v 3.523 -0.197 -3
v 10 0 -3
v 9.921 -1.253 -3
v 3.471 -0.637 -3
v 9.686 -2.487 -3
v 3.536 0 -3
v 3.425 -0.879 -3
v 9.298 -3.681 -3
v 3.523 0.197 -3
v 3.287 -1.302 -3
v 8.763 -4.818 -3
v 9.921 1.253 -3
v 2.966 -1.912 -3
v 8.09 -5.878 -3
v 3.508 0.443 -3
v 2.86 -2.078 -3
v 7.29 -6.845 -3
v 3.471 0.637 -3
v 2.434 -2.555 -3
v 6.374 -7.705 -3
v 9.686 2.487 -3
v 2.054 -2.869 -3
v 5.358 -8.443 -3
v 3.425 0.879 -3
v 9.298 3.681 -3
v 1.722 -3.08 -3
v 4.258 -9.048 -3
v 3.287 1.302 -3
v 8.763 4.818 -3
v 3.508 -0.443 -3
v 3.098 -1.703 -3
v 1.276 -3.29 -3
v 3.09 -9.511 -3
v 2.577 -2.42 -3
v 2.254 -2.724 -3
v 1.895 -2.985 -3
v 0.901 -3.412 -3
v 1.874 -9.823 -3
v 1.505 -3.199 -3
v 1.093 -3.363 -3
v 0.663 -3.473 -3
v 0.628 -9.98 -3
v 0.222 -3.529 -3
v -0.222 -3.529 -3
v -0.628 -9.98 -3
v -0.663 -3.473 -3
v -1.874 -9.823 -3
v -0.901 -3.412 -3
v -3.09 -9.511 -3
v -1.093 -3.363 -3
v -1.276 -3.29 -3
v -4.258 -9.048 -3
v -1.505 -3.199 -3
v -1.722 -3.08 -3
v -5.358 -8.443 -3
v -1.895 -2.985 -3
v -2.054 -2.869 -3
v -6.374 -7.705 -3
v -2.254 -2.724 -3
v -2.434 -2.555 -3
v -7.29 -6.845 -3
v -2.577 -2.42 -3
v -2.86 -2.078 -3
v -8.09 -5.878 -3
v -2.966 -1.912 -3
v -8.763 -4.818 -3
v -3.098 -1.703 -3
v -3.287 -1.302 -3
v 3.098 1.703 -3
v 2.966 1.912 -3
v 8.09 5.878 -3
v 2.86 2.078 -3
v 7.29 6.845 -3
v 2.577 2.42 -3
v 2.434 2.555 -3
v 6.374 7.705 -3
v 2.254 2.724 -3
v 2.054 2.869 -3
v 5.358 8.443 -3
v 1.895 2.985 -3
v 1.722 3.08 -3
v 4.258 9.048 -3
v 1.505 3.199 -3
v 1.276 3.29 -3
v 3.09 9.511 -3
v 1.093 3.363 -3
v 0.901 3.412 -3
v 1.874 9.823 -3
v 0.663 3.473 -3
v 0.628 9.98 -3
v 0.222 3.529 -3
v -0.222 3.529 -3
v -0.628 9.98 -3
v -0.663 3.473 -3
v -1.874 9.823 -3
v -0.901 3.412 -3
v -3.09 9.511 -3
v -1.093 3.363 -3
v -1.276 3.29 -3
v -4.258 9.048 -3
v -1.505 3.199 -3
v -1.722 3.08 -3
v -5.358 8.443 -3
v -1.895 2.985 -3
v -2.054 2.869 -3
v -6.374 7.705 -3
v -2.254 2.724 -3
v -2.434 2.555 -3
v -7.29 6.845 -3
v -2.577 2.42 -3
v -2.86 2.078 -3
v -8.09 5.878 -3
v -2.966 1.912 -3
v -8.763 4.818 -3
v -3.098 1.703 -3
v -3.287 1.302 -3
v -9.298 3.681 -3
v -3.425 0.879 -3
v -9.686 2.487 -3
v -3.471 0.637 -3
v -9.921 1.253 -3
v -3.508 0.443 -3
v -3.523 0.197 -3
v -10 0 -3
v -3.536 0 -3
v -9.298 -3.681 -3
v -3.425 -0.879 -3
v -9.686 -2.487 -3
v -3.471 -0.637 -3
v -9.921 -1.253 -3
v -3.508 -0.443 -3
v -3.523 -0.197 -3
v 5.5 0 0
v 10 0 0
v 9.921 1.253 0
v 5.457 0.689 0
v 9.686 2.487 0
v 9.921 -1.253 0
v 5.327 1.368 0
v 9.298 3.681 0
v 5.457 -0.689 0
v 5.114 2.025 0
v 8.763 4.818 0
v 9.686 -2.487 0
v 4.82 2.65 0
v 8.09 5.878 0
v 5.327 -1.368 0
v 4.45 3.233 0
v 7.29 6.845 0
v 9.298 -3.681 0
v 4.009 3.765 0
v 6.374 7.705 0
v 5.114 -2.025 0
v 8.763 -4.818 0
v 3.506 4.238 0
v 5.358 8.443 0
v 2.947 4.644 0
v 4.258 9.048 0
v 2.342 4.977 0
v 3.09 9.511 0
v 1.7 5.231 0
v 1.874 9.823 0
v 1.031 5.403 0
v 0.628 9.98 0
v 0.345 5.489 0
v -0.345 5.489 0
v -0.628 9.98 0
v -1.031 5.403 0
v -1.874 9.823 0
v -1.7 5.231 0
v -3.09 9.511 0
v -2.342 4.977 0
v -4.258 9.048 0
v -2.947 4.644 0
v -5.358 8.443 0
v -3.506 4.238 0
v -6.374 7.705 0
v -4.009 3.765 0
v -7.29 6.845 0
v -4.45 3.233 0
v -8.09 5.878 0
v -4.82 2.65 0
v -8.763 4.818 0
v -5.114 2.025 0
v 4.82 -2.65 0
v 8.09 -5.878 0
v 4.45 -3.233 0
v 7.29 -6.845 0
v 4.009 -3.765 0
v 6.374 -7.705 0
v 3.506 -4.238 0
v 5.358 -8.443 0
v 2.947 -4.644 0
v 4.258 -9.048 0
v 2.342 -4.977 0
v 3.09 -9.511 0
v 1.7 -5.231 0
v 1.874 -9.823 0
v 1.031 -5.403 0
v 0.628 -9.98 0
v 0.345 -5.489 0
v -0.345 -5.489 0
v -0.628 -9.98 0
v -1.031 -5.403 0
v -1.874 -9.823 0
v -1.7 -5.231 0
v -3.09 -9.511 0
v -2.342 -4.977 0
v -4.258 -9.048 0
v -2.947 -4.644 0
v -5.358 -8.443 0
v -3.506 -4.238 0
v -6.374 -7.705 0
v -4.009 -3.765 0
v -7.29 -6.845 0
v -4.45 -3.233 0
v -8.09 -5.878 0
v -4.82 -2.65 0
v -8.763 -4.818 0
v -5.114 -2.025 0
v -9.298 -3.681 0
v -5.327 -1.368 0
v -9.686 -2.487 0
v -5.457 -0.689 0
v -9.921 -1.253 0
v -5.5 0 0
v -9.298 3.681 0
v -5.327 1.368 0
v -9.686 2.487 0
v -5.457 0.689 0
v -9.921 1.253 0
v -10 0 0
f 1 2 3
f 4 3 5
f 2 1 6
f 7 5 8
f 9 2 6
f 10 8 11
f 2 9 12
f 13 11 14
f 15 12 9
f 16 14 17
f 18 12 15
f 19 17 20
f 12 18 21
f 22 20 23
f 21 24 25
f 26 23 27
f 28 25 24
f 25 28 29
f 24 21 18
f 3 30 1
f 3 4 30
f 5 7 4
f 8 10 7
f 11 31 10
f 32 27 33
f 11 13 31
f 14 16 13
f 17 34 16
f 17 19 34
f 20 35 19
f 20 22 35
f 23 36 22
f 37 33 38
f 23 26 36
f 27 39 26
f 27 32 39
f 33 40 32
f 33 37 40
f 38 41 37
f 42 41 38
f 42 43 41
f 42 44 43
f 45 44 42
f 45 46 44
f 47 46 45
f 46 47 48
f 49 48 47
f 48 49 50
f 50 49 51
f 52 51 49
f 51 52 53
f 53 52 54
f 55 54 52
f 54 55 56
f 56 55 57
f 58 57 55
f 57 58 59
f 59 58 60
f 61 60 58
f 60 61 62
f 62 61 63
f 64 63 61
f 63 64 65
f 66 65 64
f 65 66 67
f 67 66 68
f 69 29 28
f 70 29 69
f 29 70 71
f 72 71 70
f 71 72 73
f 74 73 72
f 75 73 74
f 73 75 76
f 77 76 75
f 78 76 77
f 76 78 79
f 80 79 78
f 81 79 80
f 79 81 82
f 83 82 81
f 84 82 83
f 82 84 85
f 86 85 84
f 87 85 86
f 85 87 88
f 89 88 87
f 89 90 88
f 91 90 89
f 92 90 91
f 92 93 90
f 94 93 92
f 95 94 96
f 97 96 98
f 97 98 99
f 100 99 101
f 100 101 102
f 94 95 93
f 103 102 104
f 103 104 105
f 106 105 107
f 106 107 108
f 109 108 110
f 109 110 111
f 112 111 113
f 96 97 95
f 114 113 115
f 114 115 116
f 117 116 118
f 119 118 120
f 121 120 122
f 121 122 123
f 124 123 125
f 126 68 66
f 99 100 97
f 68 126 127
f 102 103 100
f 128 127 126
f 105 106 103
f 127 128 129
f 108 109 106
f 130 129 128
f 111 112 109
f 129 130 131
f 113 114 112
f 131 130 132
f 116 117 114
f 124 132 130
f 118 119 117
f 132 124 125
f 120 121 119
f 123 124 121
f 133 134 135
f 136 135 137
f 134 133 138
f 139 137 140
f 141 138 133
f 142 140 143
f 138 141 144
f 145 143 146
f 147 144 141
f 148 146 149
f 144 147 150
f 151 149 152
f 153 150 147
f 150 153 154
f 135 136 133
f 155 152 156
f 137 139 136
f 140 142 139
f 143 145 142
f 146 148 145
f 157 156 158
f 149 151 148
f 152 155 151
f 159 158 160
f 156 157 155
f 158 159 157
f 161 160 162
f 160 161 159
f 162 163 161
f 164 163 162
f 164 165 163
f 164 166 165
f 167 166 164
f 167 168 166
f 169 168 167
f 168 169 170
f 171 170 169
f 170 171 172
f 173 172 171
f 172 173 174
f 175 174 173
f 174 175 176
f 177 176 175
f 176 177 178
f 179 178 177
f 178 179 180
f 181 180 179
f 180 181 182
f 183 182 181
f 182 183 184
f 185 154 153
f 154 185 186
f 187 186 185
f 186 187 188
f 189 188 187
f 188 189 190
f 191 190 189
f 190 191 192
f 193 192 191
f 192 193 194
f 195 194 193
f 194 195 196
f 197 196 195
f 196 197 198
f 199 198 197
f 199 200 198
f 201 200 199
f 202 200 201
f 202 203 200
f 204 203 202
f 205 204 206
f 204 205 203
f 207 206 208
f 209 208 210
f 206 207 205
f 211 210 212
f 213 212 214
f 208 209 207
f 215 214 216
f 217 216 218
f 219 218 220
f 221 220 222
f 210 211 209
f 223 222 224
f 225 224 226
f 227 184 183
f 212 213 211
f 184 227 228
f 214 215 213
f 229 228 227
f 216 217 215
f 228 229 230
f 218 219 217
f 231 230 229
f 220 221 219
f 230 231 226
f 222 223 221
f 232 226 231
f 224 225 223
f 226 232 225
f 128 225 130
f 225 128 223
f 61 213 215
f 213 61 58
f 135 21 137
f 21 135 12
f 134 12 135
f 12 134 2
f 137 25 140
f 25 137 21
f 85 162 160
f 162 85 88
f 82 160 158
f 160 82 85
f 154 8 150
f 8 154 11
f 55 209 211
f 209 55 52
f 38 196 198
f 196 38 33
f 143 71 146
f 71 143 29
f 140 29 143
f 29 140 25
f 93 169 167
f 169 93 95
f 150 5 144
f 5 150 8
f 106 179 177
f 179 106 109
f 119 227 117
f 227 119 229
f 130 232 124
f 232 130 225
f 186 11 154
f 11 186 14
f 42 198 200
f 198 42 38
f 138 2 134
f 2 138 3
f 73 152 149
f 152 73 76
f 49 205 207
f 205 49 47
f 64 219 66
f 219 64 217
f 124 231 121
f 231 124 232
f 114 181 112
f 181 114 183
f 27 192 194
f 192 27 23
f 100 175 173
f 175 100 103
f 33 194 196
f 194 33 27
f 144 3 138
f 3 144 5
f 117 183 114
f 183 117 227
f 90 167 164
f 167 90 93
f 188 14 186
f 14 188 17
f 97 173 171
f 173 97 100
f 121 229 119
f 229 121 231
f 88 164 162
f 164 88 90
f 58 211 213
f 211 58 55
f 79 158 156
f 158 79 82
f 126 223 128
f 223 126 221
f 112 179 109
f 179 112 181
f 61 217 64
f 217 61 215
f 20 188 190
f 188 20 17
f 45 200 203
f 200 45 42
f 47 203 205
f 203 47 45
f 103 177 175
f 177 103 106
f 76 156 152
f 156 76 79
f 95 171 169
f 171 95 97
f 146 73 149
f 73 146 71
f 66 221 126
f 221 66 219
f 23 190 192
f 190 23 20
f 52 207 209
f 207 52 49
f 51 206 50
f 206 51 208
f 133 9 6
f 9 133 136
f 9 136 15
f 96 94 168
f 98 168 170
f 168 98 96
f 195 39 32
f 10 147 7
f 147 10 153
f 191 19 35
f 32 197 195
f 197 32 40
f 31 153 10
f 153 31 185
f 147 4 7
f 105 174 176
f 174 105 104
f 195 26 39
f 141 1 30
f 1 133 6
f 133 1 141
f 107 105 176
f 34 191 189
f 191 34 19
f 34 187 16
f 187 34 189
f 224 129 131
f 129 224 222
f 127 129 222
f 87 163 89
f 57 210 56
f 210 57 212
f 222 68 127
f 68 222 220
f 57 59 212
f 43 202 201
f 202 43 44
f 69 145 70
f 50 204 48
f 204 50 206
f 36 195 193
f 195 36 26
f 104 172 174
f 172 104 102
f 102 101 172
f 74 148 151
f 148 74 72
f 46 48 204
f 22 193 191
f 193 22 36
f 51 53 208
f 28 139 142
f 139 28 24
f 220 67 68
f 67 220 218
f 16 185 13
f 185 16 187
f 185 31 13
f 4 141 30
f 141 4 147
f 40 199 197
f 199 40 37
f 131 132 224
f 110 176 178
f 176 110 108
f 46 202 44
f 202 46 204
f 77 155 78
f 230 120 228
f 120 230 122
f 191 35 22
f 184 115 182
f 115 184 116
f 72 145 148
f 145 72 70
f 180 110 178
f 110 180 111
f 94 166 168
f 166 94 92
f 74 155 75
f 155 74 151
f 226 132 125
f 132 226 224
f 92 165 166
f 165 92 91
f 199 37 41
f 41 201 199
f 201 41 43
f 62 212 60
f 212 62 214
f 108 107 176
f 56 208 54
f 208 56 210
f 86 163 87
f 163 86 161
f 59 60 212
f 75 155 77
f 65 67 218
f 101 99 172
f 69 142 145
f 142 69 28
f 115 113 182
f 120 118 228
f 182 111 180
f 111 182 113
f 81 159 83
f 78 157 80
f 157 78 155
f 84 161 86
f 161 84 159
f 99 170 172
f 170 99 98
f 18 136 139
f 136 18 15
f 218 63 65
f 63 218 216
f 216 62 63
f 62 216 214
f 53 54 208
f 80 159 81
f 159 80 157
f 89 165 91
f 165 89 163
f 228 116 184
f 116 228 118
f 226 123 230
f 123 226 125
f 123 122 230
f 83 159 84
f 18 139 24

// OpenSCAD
$fn = 50;


difference() {
	union() {
		translate(v = [0, 0, -3.0000000000]) {
			cylinder(h = 3, r = 7.0000000000);
		}
		translate(v = [0, 0, -3.0000000000]) {
			cylinder(h = 3, r = 10.0000000000);
		}
	}
	union() {
		translate(v = [0, 0, 0]) {
			rotate(a = [0, 0, 0]) {
				difference() {
					union() {
						#translate(v = [0, 0, -3.0000000000]) {
							cylinder(h = 3, r = 2.2500000000);
						}
						#translate(v = [0, 0, -4.2000000000]) {
							cylinder(h = 4.2000000000, r = 7.0000000000, r1 = 2.7500000000, r2 = 5.5000000000);
						}
						#translate(v = [0, 0, -3.0000000000]) {
							cylinder(h = 3, r = 2.7500000000);
						}
						#translate(v = [0, 0, -3.0000000000]) {
							cylinder(h = 3, r = 2.2500000000);
						}
					}
					union();
				}
			}
		}
	}
}
